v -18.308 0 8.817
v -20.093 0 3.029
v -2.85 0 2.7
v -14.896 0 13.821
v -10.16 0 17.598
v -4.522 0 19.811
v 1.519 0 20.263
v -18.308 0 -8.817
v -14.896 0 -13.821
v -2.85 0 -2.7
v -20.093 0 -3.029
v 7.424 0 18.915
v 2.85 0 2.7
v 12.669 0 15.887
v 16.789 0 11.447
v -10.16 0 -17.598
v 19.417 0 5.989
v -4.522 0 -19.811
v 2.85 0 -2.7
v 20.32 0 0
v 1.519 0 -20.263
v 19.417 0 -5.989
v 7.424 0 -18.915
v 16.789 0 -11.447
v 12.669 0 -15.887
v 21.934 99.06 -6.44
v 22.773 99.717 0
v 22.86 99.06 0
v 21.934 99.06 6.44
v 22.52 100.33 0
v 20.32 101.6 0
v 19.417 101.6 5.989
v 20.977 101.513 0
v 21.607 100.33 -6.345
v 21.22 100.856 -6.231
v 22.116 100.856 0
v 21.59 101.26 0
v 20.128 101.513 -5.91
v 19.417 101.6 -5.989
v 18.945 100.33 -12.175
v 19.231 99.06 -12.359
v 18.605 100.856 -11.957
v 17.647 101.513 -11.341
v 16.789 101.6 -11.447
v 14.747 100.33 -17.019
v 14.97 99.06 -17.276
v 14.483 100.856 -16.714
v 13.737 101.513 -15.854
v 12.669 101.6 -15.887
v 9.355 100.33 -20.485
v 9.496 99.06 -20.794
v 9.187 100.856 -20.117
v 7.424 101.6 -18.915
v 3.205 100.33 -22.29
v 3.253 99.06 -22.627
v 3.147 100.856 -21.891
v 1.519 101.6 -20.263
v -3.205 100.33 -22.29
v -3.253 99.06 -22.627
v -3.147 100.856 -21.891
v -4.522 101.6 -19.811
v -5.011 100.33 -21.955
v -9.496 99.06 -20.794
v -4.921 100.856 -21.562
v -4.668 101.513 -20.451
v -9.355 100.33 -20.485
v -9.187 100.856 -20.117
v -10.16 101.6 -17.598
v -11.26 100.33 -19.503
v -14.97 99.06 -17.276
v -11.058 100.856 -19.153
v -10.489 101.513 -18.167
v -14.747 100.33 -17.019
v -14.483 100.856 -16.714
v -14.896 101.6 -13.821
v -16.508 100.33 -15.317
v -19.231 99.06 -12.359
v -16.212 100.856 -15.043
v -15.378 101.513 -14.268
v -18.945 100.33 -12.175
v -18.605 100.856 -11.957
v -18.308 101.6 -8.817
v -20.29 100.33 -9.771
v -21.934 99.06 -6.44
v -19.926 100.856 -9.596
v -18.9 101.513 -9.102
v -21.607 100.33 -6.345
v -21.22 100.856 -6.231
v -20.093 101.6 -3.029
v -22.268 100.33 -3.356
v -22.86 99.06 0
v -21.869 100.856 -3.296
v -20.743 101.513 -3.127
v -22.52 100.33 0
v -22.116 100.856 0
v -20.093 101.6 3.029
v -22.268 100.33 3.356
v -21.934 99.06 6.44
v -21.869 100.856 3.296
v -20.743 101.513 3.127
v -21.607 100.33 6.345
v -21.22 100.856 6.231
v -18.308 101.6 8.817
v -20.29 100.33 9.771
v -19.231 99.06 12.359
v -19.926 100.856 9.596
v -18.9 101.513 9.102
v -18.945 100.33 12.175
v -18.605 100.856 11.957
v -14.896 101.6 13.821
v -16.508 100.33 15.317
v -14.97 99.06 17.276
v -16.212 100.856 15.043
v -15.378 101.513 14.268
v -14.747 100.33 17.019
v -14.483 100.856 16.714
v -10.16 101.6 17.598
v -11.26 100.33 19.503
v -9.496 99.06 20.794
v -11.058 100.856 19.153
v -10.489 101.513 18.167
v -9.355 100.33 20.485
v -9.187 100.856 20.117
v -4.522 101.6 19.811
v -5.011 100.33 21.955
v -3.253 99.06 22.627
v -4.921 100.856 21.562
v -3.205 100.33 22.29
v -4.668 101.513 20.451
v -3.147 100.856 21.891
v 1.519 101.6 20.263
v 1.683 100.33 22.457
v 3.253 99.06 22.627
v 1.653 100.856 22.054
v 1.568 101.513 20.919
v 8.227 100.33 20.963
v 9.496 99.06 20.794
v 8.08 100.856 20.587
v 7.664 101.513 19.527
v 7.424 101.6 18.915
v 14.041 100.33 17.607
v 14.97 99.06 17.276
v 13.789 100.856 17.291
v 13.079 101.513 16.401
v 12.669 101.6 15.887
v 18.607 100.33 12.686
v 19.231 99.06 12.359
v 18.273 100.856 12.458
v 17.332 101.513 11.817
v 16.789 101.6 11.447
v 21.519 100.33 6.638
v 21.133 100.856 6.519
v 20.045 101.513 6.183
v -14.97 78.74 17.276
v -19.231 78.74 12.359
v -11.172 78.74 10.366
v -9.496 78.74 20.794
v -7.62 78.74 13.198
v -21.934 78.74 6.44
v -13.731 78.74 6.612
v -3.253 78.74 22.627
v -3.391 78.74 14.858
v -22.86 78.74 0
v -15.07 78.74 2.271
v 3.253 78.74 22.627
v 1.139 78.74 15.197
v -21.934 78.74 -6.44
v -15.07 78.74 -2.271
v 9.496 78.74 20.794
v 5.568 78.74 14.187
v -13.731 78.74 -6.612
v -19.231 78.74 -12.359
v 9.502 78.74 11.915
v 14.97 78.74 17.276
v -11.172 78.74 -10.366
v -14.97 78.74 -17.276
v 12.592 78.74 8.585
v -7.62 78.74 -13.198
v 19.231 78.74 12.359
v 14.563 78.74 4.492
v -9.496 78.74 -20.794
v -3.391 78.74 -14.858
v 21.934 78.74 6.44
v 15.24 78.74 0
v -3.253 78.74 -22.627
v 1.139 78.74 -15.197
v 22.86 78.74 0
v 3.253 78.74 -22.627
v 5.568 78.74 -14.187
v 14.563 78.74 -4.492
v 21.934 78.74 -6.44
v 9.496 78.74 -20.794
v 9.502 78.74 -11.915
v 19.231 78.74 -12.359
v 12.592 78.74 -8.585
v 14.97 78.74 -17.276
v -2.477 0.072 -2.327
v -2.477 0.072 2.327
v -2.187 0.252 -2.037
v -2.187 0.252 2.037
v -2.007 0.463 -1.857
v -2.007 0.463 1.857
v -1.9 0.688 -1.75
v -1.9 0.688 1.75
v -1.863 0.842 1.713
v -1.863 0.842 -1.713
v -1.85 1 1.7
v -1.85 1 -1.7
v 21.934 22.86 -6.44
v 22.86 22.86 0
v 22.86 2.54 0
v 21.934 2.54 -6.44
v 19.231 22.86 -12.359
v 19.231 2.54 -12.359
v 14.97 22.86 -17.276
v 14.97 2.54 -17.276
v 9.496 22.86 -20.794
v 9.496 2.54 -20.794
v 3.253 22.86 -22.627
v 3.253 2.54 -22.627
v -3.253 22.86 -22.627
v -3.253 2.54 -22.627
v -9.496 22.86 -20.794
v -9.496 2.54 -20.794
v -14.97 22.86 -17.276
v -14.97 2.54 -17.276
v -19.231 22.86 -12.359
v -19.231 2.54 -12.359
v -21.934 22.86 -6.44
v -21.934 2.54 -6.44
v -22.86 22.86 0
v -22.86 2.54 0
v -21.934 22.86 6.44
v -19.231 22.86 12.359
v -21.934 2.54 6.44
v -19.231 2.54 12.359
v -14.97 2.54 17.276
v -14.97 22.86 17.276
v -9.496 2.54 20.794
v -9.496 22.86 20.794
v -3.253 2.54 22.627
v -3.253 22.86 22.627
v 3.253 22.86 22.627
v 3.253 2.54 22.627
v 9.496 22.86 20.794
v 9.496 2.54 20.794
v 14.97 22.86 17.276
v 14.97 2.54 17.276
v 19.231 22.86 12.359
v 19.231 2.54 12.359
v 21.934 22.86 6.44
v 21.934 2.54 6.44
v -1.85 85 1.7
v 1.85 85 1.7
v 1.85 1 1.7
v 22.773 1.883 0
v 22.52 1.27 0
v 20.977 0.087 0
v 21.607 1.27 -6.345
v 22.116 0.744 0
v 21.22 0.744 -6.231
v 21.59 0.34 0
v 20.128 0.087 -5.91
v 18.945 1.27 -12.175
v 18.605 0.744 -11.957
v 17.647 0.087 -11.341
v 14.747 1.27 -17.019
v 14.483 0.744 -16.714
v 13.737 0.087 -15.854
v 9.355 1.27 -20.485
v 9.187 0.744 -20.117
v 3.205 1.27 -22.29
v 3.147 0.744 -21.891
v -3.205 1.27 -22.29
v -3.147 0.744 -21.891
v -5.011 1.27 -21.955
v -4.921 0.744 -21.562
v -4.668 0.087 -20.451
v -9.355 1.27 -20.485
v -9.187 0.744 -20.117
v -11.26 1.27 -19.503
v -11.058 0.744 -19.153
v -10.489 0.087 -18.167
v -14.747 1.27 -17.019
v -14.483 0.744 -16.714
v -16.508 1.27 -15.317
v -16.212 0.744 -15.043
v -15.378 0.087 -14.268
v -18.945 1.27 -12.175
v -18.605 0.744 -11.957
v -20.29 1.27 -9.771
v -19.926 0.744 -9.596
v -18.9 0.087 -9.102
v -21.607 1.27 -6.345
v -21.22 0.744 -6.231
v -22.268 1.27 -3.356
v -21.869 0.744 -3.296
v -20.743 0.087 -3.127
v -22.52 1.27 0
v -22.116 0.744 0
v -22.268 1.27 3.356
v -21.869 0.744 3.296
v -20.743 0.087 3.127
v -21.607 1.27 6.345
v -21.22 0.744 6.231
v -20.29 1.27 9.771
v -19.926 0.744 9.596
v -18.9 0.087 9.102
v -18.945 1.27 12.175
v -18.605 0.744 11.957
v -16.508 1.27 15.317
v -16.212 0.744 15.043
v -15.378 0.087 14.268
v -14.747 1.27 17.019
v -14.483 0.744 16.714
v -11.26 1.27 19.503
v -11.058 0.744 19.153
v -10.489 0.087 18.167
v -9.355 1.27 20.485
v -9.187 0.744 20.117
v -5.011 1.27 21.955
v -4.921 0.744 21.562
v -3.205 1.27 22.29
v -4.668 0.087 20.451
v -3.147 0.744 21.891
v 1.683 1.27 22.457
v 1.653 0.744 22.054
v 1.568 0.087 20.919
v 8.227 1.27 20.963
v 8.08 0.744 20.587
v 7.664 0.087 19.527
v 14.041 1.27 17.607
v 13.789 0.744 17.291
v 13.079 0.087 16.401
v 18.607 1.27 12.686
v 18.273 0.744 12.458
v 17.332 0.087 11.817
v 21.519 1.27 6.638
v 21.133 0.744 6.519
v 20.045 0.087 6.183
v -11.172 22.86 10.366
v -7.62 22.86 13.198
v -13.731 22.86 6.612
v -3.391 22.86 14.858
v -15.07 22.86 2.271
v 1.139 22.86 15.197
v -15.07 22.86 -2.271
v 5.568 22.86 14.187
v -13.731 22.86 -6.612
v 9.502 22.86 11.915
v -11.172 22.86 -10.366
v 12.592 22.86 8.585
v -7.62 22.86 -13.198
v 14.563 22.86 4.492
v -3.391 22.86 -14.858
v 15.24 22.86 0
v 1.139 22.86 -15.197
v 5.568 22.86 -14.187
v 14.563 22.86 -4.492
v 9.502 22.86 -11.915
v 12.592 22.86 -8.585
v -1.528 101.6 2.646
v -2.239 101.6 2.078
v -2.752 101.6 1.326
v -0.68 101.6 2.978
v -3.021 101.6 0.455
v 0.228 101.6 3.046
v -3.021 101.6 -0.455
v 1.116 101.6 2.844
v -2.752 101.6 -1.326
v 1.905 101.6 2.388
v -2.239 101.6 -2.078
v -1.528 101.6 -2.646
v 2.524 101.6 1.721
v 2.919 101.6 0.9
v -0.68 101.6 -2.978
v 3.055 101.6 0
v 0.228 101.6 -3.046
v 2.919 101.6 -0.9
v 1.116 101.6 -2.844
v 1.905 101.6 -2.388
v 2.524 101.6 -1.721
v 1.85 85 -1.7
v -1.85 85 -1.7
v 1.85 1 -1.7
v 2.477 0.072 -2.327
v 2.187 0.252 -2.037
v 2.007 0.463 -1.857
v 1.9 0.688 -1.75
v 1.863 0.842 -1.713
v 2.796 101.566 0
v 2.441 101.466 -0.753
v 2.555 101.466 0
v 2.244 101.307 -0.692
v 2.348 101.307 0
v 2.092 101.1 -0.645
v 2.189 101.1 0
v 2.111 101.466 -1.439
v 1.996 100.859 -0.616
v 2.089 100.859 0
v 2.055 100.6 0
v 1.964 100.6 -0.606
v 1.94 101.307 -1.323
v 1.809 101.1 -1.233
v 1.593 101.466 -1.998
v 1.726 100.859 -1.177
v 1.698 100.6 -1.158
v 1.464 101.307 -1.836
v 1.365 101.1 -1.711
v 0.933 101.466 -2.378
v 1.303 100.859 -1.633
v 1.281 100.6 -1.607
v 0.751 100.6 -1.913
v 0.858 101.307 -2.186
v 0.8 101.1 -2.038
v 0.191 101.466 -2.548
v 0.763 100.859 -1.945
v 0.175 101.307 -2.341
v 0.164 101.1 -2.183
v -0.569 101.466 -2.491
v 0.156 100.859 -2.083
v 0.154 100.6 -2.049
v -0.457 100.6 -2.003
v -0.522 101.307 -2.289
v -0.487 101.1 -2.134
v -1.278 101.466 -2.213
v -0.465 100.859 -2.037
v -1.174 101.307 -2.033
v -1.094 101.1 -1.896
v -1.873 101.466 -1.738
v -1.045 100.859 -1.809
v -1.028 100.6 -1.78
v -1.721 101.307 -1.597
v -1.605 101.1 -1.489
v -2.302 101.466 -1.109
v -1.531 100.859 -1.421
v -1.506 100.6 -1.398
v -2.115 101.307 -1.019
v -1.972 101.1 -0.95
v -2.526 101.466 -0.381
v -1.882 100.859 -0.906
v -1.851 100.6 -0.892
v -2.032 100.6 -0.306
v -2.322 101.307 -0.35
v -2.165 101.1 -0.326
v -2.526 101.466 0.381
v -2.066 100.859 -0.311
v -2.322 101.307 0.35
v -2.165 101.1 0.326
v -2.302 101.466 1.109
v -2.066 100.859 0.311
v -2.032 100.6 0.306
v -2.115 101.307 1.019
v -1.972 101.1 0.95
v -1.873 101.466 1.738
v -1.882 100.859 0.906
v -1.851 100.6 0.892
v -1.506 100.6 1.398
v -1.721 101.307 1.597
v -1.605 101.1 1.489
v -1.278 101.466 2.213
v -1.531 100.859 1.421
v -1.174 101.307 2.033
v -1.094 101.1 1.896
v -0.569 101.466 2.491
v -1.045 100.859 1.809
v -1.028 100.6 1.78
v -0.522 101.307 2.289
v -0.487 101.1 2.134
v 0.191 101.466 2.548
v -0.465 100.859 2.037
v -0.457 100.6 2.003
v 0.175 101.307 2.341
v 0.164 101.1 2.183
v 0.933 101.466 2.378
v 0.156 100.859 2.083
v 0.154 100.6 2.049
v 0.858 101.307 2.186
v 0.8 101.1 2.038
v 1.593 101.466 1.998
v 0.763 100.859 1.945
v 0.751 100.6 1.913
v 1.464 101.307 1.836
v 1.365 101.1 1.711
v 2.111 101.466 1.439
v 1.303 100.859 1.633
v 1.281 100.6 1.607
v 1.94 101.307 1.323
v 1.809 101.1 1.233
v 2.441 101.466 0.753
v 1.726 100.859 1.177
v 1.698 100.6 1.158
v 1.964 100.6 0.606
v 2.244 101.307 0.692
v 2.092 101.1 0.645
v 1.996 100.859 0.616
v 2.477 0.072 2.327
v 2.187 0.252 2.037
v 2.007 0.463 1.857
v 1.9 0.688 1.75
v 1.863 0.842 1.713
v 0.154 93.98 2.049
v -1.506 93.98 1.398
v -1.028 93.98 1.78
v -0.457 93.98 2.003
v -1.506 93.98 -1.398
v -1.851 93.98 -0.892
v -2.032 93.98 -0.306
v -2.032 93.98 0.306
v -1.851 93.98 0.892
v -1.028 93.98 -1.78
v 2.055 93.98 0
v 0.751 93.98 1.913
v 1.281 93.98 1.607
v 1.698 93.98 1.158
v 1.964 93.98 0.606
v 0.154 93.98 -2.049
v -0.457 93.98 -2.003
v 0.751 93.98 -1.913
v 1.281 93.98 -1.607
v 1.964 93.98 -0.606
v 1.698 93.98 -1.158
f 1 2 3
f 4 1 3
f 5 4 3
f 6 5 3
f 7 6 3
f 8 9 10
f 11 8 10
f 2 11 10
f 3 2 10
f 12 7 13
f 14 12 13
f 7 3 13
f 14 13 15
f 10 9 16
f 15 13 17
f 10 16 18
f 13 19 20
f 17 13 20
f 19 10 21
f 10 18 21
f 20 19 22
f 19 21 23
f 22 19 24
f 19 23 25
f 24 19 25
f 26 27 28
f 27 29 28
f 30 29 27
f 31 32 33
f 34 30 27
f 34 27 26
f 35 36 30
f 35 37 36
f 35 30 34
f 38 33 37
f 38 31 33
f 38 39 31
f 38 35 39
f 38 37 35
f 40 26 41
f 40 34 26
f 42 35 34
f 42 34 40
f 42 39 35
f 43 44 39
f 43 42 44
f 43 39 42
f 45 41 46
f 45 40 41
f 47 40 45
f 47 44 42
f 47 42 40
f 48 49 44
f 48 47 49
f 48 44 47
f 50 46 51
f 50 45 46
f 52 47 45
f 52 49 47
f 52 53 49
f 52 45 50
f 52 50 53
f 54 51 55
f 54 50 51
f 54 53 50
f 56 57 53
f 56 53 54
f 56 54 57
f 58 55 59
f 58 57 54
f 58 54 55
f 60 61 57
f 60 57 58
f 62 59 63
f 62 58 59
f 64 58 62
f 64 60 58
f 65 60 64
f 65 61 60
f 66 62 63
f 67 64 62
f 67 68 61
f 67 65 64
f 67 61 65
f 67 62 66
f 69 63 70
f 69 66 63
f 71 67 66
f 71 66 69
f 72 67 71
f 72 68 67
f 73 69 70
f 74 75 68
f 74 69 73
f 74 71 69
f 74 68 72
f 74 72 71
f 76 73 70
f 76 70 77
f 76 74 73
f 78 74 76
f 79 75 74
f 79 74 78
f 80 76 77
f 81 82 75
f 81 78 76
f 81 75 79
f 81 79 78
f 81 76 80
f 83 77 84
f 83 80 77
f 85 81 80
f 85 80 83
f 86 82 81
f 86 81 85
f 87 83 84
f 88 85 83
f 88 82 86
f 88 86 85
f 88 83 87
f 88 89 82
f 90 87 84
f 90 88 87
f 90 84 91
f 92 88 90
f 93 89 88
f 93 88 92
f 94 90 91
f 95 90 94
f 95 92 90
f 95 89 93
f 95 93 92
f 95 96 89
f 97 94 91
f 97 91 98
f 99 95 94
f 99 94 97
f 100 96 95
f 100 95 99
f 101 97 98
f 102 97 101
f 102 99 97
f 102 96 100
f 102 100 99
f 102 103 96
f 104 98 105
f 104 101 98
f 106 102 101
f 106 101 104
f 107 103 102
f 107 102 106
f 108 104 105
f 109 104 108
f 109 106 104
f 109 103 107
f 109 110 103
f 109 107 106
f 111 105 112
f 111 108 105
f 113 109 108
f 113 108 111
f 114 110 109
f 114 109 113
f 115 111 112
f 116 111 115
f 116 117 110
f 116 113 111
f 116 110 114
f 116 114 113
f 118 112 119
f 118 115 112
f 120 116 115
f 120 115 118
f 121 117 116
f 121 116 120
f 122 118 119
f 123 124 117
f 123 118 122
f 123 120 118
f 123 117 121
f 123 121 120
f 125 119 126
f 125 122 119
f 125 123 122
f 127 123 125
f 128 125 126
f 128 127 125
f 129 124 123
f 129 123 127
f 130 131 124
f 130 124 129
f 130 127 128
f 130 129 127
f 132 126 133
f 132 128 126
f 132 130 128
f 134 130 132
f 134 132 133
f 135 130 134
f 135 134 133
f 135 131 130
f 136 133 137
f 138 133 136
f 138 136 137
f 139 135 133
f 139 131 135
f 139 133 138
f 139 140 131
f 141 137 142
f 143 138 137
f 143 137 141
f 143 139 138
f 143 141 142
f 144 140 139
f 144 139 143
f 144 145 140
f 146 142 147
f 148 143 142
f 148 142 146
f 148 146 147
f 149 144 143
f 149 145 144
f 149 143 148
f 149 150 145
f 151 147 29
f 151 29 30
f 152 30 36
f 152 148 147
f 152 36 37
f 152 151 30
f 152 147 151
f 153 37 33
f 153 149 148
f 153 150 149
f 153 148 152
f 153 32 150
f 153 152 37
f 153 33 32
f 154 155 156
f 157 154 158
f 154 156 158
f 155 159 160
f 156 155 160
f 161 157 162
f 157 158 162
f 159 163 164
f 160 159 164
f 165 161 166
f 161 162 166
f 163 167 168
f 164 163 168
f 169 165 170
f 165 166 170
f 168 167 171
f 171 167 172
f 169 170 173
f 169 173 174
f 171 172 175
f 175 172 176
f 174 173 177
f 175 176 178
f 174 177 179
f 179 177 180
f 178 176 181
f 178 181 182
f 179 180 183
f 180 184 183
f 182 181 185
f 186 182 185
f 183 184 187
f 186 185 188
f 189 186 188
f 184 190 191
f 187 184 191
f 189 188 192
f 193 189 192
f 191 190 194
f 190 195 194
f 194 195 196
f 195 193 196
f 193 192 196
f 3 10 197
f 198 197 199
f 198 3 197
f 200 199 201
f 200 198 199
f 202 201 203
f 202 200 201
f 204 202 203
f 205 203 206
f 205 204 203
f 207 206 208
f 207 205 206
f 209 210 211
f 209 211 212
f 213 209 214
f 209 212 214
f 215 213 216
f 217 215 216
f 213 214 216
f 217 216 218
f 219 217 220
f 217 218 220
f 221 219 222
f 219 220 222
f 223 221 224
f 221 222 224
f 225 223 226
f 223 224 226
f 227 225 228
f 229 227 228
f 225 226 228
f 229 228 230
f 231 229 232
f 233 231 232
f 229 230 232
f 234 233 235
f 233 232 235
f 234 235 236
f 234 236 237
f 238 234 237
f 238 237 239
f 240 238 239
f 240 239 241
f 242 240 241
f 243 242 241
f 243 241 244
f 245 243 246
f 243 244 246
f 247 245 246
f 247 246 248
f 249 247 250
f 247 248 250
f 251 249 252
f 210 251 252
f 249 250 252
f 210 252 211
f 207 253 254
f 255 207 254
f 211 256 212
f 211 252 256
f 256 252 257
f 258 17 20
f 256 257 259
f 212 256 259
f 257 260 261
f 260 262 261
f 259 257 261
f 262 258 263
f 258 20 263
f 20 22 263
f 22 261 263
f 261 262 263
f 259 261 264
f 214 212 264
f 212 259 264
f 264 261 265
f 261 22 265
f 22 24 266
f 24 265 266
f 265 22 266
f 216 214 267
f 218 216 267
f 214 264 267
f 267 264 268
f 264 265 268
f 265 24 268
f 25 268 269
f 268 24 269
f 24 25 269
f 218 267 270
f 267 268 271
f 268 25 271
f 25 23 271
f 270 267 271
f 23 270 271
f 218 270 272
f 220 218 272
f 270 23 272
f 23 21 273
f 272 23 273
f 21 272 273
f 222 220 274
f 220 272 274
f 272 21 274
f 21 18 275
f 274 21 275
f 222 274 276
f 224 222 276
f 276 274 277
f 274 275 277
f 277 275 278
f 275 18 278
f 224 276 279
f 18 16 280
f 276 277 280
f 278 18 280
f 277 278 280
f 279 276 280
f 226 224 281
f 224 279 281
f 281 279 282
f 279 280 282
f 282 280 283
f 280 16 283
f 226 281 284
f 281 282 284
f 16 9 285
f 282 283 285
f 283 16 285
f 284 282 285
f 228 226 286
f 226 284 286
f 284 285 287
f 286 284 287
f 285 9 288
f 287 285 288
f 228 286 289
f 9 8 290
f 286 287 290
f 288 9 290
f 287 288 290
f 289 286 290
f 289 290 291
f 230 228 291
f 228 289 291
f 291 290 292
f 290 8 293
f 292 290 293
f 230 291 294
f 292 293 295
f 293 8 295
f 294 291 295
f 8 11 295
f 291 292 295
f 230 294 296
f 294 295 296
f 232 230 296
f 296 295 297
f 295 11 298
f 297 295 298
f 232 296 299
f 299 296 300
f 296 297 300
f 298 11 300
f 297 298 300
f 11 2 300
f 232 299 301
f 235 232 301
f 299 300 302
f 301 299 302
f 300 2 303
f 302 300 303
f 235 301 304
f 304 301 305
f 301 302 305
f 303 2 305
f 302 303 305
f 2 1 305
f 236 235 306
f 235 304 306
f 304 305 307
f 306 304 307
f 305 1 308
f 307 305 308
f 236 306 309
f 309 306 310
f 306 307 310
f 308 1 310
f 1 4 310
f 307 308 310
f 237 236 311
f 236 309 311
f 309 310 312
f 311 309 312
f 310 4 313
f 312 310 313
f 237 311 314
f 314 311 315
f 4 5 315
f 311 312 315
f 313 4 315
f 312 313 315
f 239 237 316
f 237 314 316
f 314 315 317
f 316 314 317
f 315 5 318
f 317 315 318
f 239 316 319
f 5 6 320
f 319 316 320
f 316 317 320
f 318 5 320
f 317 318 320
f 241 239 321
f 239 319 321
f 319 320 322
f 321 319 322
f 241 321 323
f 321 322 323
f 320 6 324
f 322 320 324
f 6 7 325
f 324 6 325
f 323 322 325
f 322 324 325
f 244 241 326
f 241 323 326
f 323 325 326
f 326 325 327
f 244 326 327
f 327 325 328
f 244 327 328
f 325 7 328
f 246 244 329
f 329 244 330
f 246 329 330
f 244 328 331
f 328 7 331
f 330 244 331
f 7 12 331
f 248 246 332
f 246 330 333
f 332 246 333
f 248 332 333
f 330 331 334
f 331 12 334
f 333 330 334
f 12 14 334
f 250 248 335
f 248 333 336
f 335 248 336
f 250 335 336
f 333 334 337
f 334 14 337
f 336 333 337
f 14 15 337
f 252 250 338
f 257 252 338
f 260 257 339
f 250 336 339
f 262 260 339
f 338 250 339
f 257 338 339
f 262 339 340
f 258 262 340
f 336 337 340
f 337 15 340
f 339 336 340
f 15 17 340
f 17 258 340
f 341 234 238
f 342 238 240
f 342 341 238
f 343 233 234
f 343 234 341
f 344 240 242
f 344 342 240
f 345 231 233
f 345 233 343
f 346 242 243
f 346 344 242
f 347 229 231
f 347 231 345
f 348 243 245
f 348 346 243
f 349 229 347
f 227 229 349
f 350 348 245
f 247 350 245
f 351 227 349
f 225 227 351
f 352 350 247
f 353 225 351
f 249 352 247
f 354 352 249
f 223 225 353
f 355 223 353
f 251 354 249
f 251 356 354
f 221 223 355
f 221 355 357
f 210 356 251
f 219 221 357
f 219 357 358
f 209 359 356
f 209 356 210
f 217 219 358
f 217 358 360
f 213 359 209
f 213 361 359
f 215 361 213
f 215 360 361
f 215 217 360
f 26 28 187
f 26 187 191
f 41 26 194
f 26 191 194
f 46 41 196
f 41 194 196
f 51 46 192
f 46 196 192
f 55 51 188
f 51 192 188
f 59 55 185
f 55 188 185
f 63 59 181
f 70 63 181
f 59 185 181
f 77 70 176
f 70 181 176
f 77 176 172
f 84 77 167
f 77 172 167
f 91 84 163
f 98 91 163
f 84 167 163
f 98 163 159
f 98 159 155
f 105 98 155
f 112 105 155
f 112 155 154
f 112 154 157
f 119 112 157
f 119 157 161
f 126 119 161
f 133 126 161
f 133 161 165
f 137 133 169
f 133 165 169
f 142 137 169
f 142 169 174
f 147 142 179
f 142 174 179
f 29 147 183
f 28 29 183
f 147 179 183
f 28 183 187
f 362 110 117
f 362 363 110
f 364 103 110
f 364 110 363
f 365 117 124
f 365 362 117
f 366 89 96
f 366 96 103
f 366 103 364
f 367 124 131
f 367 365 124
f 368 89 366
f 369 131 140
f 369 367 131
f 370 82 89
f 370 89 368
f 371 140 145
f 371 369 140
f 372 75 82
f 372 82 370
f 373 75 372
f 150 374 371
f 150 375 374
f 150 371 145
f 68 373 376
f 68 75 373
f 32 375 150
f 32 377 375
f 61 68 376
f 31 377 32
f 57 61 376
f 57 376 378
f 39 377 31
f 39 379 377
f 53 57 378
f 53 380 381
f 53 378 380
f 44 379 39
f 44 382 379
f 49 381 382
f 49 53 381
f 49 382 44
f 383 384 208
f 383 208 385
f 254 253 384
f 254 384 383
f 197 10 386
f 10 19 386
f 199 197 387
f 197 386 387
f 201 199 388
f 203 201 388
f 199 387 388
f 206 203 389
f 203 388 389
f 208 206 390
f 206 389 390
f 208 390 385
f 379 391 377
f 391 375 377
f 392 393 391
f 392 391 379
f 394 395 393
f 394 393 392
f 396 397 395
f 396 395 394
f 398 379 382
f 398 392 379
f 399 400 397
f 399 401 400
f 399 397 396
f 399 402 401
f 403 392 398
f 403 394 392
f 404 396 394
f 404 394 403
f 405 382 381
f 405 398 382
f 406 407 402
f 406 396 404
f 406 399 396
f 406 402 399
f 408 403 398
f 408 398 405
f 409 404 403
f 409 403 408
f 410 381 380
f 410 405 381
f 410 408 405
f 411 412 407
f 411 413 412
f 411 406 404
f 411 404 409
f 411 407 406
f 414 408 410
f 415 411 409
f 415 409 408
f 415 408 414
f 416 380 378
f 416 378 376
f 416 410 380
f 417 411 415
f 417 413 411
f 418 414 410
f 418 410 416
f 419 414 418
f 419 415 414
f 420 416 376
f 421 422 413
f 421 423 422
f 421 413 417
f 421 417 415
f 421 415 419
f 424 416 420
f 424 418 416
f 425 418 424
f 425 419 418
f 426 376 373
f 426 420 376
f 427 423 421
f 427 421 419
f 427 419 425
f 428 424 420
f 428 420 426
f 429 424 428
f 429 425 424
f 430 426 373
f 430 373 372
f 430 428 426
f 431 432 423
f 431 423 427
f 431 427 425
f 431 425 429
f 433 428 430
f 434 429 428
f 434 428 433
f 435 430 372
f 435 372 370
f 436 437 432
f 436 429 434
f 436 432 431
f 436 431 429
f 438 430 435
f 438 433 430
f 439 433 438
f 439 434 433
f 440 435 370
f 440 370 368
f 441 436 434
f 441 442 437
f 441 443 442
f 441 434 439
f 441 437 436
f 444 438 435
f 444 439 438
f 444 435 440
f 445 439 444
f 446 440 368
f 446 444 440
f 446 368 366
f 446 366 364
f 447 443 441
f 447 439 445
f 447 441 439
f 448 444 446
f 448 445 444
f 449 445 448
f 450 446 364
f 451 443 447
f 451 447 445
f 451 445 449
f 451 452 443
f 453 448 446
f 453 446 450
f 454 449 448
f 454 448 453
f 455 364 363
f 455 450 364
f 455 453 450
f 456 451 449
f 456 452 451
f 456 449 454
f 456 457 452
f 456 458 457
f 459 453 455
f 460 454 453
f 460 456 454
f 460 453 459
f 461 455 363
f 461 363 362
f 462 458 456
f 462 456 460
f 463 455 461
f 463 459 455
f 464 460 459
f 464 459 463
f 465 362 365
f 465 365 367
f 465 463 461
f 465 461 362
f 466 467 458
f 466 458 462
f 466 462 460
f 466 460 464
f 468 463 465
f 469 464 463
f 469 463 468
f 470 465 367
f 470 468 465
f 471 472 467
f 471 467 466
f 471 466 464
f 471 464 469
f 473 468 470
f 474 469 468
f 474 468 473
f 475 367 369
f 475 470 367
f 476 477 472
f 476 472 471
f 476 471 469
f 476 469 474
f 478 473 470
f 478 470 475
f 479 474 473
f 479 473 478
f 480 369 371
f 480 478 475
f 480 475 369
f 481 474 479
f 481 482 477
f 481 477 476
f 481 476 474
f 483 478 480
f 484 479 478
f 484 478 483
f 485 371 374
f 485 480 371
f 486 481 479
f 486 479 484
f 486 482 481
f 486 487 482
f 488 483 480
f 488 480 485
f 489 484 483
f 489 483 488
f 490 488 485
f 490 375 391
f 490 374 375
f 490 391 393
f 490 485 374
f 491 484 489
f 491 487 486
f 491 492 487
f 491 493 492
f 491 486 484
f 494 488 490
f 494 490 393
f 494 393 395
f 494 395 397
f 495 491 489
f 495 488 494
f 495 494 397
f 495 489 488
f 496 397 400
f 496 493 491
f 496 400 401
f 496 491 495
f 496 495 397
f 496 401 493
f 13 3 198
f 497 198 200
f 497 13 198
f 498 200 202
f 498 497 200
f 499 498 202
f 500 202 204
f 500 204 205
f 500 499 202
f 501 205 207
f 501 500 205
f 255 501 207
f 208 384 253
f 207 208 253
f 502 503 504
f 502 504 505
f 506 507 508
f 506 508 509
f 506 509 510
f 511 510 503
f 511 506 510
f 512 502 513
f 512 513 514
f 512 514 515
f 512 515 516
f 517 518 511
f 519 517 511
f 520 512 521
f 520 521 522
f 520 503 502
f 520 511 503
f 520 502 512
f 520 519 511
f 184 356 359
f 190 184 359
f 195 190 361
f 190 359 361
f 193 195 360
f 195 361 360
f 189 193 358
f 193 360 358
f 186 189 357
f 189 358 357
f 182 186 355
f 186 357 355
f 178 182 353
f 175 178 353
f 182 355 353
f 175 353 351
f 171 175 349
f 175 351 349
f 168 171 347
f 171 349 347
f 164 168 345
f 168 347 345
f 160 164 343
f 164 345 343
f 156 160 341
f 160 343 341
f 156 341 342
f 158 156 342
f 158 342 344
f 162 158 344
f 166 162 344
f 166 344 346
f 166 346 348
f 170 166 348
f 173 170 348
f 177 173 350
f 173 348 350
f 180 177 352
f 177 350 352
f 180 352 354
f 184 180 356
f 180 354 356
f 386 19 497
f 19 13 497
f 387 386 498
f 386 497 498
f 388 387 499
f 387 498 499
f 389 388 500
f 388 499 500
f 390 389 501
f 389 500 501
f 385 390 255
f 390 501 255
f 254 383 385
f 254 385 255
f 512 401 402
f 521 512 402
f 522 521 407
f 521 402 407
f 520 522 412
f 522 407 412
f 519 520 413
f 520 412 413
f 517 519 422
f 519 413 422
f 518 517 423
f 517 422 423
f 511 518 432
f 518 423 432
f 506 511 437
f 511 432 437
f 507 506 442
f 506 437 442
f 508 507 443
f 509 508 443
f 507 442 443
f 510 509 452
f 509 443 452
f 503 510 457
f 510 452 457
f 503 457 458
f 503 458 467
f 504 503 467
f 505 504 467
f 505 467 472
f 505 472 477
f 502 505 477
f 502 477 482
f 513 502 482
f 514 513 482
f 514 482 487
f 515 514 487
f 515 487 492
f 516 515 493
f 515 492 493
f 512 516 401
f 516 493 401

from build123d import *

# Parameters (mm, degrees)
SKETCH1_R           = 22.86
BOSS_EXTRUDE1_DEPTH = 22.86
SKETCH3_R           = 15.24
BOSS_EXTRUDE2_DEPTH = 55.88
SKETCH4_R           = 22.86
BOSS_EXTRUDE3_DEPTH = 22.86
FILLET3_R           = 2.54
SKETCH5_R           = 2.055
CUT_EXTRUDE1_DEPTH  = 7.62
SKETCH8_W           = 3.7
SKETCH8_H           = 3.4
CUT_EXTRUDE2_DEPTH  = 85
FILLET4_R           = 1


with BuildPart() as part:
    # Sketch1 → Boss-Extrude1 (new body)
    with BuildSketch(Plane(origin=(0, 0, 0), x_dir=(1, 0, 0), z_dir=(0, 1, 0))):
        Circle(SKETCH1_R)
    extrude(amount=BOSS_EXTRUDE1_DEPTH)

    # Sketch3 → Boss-Extrude2 (add)
    with BuildSketch(Plane(origin=(0, 22.86, 0), x_dir=(1, 0, 0), z_dir=(0, 1, 0))):
        Circle(SKETCH3_R)
    extrude(amount=BOSS_EXTRUDE2_DEPTH)

    # Sketch4 → Boss-Extrude3 (add)
    with BuildSketch(Plane(origin=(0, 78.74, 0), x_dir=(1, 0, 0), z_dir=(0, 1, 0))):
        Circle(SKETCH4_R)
    extrude(amount=BOSS_EXTRUDE3_DEPTH)

    # Fillet3
    fillet3_edges = [part.edges().sort_by_distance(p)[0] for p in [
        (-22.86, 101.6, 0),
        (-22.86, 0, 0),
    ]]
    fillet(fillet3_edges, radius=FILLET3_R)

    # Sketch5 → Cut-Extrude1 (cut)
    with BuildSketch(Plane(origin=(0, 101.6, 0), x_dir=(1, 0, 0), z_dir=(0, 1, 0))):
        Circle(SKETCH5_R)
    extrude(amount=-CUT_EXTRUDE1_DEPTH, mode=Mode.SUBTRACT)

    # Sketch8 → Cut-Extrude2 (cut)
    with BuildSketch(Plane.XZ):
        Rectangle(SKETCH8_W, SKETCH8_H)
    extrude(amount=-CUT_EXTRUDE2_DEPTH, mode=Mode.SUBTRACT)

    # Fillet4
    fillet4_edges = [part.edges().sort_by_distance(p)[0] for p in [
        (-2.055, 101.6, 0),
        (-1.85, 0, 0),
        (0, 0, -1.7),
        (1.85, 0, 0),
        (0, 0, 1.7),
    ]]
    fillet(fillet4_edges, radius=FILLET4_R)


solid = part.part
